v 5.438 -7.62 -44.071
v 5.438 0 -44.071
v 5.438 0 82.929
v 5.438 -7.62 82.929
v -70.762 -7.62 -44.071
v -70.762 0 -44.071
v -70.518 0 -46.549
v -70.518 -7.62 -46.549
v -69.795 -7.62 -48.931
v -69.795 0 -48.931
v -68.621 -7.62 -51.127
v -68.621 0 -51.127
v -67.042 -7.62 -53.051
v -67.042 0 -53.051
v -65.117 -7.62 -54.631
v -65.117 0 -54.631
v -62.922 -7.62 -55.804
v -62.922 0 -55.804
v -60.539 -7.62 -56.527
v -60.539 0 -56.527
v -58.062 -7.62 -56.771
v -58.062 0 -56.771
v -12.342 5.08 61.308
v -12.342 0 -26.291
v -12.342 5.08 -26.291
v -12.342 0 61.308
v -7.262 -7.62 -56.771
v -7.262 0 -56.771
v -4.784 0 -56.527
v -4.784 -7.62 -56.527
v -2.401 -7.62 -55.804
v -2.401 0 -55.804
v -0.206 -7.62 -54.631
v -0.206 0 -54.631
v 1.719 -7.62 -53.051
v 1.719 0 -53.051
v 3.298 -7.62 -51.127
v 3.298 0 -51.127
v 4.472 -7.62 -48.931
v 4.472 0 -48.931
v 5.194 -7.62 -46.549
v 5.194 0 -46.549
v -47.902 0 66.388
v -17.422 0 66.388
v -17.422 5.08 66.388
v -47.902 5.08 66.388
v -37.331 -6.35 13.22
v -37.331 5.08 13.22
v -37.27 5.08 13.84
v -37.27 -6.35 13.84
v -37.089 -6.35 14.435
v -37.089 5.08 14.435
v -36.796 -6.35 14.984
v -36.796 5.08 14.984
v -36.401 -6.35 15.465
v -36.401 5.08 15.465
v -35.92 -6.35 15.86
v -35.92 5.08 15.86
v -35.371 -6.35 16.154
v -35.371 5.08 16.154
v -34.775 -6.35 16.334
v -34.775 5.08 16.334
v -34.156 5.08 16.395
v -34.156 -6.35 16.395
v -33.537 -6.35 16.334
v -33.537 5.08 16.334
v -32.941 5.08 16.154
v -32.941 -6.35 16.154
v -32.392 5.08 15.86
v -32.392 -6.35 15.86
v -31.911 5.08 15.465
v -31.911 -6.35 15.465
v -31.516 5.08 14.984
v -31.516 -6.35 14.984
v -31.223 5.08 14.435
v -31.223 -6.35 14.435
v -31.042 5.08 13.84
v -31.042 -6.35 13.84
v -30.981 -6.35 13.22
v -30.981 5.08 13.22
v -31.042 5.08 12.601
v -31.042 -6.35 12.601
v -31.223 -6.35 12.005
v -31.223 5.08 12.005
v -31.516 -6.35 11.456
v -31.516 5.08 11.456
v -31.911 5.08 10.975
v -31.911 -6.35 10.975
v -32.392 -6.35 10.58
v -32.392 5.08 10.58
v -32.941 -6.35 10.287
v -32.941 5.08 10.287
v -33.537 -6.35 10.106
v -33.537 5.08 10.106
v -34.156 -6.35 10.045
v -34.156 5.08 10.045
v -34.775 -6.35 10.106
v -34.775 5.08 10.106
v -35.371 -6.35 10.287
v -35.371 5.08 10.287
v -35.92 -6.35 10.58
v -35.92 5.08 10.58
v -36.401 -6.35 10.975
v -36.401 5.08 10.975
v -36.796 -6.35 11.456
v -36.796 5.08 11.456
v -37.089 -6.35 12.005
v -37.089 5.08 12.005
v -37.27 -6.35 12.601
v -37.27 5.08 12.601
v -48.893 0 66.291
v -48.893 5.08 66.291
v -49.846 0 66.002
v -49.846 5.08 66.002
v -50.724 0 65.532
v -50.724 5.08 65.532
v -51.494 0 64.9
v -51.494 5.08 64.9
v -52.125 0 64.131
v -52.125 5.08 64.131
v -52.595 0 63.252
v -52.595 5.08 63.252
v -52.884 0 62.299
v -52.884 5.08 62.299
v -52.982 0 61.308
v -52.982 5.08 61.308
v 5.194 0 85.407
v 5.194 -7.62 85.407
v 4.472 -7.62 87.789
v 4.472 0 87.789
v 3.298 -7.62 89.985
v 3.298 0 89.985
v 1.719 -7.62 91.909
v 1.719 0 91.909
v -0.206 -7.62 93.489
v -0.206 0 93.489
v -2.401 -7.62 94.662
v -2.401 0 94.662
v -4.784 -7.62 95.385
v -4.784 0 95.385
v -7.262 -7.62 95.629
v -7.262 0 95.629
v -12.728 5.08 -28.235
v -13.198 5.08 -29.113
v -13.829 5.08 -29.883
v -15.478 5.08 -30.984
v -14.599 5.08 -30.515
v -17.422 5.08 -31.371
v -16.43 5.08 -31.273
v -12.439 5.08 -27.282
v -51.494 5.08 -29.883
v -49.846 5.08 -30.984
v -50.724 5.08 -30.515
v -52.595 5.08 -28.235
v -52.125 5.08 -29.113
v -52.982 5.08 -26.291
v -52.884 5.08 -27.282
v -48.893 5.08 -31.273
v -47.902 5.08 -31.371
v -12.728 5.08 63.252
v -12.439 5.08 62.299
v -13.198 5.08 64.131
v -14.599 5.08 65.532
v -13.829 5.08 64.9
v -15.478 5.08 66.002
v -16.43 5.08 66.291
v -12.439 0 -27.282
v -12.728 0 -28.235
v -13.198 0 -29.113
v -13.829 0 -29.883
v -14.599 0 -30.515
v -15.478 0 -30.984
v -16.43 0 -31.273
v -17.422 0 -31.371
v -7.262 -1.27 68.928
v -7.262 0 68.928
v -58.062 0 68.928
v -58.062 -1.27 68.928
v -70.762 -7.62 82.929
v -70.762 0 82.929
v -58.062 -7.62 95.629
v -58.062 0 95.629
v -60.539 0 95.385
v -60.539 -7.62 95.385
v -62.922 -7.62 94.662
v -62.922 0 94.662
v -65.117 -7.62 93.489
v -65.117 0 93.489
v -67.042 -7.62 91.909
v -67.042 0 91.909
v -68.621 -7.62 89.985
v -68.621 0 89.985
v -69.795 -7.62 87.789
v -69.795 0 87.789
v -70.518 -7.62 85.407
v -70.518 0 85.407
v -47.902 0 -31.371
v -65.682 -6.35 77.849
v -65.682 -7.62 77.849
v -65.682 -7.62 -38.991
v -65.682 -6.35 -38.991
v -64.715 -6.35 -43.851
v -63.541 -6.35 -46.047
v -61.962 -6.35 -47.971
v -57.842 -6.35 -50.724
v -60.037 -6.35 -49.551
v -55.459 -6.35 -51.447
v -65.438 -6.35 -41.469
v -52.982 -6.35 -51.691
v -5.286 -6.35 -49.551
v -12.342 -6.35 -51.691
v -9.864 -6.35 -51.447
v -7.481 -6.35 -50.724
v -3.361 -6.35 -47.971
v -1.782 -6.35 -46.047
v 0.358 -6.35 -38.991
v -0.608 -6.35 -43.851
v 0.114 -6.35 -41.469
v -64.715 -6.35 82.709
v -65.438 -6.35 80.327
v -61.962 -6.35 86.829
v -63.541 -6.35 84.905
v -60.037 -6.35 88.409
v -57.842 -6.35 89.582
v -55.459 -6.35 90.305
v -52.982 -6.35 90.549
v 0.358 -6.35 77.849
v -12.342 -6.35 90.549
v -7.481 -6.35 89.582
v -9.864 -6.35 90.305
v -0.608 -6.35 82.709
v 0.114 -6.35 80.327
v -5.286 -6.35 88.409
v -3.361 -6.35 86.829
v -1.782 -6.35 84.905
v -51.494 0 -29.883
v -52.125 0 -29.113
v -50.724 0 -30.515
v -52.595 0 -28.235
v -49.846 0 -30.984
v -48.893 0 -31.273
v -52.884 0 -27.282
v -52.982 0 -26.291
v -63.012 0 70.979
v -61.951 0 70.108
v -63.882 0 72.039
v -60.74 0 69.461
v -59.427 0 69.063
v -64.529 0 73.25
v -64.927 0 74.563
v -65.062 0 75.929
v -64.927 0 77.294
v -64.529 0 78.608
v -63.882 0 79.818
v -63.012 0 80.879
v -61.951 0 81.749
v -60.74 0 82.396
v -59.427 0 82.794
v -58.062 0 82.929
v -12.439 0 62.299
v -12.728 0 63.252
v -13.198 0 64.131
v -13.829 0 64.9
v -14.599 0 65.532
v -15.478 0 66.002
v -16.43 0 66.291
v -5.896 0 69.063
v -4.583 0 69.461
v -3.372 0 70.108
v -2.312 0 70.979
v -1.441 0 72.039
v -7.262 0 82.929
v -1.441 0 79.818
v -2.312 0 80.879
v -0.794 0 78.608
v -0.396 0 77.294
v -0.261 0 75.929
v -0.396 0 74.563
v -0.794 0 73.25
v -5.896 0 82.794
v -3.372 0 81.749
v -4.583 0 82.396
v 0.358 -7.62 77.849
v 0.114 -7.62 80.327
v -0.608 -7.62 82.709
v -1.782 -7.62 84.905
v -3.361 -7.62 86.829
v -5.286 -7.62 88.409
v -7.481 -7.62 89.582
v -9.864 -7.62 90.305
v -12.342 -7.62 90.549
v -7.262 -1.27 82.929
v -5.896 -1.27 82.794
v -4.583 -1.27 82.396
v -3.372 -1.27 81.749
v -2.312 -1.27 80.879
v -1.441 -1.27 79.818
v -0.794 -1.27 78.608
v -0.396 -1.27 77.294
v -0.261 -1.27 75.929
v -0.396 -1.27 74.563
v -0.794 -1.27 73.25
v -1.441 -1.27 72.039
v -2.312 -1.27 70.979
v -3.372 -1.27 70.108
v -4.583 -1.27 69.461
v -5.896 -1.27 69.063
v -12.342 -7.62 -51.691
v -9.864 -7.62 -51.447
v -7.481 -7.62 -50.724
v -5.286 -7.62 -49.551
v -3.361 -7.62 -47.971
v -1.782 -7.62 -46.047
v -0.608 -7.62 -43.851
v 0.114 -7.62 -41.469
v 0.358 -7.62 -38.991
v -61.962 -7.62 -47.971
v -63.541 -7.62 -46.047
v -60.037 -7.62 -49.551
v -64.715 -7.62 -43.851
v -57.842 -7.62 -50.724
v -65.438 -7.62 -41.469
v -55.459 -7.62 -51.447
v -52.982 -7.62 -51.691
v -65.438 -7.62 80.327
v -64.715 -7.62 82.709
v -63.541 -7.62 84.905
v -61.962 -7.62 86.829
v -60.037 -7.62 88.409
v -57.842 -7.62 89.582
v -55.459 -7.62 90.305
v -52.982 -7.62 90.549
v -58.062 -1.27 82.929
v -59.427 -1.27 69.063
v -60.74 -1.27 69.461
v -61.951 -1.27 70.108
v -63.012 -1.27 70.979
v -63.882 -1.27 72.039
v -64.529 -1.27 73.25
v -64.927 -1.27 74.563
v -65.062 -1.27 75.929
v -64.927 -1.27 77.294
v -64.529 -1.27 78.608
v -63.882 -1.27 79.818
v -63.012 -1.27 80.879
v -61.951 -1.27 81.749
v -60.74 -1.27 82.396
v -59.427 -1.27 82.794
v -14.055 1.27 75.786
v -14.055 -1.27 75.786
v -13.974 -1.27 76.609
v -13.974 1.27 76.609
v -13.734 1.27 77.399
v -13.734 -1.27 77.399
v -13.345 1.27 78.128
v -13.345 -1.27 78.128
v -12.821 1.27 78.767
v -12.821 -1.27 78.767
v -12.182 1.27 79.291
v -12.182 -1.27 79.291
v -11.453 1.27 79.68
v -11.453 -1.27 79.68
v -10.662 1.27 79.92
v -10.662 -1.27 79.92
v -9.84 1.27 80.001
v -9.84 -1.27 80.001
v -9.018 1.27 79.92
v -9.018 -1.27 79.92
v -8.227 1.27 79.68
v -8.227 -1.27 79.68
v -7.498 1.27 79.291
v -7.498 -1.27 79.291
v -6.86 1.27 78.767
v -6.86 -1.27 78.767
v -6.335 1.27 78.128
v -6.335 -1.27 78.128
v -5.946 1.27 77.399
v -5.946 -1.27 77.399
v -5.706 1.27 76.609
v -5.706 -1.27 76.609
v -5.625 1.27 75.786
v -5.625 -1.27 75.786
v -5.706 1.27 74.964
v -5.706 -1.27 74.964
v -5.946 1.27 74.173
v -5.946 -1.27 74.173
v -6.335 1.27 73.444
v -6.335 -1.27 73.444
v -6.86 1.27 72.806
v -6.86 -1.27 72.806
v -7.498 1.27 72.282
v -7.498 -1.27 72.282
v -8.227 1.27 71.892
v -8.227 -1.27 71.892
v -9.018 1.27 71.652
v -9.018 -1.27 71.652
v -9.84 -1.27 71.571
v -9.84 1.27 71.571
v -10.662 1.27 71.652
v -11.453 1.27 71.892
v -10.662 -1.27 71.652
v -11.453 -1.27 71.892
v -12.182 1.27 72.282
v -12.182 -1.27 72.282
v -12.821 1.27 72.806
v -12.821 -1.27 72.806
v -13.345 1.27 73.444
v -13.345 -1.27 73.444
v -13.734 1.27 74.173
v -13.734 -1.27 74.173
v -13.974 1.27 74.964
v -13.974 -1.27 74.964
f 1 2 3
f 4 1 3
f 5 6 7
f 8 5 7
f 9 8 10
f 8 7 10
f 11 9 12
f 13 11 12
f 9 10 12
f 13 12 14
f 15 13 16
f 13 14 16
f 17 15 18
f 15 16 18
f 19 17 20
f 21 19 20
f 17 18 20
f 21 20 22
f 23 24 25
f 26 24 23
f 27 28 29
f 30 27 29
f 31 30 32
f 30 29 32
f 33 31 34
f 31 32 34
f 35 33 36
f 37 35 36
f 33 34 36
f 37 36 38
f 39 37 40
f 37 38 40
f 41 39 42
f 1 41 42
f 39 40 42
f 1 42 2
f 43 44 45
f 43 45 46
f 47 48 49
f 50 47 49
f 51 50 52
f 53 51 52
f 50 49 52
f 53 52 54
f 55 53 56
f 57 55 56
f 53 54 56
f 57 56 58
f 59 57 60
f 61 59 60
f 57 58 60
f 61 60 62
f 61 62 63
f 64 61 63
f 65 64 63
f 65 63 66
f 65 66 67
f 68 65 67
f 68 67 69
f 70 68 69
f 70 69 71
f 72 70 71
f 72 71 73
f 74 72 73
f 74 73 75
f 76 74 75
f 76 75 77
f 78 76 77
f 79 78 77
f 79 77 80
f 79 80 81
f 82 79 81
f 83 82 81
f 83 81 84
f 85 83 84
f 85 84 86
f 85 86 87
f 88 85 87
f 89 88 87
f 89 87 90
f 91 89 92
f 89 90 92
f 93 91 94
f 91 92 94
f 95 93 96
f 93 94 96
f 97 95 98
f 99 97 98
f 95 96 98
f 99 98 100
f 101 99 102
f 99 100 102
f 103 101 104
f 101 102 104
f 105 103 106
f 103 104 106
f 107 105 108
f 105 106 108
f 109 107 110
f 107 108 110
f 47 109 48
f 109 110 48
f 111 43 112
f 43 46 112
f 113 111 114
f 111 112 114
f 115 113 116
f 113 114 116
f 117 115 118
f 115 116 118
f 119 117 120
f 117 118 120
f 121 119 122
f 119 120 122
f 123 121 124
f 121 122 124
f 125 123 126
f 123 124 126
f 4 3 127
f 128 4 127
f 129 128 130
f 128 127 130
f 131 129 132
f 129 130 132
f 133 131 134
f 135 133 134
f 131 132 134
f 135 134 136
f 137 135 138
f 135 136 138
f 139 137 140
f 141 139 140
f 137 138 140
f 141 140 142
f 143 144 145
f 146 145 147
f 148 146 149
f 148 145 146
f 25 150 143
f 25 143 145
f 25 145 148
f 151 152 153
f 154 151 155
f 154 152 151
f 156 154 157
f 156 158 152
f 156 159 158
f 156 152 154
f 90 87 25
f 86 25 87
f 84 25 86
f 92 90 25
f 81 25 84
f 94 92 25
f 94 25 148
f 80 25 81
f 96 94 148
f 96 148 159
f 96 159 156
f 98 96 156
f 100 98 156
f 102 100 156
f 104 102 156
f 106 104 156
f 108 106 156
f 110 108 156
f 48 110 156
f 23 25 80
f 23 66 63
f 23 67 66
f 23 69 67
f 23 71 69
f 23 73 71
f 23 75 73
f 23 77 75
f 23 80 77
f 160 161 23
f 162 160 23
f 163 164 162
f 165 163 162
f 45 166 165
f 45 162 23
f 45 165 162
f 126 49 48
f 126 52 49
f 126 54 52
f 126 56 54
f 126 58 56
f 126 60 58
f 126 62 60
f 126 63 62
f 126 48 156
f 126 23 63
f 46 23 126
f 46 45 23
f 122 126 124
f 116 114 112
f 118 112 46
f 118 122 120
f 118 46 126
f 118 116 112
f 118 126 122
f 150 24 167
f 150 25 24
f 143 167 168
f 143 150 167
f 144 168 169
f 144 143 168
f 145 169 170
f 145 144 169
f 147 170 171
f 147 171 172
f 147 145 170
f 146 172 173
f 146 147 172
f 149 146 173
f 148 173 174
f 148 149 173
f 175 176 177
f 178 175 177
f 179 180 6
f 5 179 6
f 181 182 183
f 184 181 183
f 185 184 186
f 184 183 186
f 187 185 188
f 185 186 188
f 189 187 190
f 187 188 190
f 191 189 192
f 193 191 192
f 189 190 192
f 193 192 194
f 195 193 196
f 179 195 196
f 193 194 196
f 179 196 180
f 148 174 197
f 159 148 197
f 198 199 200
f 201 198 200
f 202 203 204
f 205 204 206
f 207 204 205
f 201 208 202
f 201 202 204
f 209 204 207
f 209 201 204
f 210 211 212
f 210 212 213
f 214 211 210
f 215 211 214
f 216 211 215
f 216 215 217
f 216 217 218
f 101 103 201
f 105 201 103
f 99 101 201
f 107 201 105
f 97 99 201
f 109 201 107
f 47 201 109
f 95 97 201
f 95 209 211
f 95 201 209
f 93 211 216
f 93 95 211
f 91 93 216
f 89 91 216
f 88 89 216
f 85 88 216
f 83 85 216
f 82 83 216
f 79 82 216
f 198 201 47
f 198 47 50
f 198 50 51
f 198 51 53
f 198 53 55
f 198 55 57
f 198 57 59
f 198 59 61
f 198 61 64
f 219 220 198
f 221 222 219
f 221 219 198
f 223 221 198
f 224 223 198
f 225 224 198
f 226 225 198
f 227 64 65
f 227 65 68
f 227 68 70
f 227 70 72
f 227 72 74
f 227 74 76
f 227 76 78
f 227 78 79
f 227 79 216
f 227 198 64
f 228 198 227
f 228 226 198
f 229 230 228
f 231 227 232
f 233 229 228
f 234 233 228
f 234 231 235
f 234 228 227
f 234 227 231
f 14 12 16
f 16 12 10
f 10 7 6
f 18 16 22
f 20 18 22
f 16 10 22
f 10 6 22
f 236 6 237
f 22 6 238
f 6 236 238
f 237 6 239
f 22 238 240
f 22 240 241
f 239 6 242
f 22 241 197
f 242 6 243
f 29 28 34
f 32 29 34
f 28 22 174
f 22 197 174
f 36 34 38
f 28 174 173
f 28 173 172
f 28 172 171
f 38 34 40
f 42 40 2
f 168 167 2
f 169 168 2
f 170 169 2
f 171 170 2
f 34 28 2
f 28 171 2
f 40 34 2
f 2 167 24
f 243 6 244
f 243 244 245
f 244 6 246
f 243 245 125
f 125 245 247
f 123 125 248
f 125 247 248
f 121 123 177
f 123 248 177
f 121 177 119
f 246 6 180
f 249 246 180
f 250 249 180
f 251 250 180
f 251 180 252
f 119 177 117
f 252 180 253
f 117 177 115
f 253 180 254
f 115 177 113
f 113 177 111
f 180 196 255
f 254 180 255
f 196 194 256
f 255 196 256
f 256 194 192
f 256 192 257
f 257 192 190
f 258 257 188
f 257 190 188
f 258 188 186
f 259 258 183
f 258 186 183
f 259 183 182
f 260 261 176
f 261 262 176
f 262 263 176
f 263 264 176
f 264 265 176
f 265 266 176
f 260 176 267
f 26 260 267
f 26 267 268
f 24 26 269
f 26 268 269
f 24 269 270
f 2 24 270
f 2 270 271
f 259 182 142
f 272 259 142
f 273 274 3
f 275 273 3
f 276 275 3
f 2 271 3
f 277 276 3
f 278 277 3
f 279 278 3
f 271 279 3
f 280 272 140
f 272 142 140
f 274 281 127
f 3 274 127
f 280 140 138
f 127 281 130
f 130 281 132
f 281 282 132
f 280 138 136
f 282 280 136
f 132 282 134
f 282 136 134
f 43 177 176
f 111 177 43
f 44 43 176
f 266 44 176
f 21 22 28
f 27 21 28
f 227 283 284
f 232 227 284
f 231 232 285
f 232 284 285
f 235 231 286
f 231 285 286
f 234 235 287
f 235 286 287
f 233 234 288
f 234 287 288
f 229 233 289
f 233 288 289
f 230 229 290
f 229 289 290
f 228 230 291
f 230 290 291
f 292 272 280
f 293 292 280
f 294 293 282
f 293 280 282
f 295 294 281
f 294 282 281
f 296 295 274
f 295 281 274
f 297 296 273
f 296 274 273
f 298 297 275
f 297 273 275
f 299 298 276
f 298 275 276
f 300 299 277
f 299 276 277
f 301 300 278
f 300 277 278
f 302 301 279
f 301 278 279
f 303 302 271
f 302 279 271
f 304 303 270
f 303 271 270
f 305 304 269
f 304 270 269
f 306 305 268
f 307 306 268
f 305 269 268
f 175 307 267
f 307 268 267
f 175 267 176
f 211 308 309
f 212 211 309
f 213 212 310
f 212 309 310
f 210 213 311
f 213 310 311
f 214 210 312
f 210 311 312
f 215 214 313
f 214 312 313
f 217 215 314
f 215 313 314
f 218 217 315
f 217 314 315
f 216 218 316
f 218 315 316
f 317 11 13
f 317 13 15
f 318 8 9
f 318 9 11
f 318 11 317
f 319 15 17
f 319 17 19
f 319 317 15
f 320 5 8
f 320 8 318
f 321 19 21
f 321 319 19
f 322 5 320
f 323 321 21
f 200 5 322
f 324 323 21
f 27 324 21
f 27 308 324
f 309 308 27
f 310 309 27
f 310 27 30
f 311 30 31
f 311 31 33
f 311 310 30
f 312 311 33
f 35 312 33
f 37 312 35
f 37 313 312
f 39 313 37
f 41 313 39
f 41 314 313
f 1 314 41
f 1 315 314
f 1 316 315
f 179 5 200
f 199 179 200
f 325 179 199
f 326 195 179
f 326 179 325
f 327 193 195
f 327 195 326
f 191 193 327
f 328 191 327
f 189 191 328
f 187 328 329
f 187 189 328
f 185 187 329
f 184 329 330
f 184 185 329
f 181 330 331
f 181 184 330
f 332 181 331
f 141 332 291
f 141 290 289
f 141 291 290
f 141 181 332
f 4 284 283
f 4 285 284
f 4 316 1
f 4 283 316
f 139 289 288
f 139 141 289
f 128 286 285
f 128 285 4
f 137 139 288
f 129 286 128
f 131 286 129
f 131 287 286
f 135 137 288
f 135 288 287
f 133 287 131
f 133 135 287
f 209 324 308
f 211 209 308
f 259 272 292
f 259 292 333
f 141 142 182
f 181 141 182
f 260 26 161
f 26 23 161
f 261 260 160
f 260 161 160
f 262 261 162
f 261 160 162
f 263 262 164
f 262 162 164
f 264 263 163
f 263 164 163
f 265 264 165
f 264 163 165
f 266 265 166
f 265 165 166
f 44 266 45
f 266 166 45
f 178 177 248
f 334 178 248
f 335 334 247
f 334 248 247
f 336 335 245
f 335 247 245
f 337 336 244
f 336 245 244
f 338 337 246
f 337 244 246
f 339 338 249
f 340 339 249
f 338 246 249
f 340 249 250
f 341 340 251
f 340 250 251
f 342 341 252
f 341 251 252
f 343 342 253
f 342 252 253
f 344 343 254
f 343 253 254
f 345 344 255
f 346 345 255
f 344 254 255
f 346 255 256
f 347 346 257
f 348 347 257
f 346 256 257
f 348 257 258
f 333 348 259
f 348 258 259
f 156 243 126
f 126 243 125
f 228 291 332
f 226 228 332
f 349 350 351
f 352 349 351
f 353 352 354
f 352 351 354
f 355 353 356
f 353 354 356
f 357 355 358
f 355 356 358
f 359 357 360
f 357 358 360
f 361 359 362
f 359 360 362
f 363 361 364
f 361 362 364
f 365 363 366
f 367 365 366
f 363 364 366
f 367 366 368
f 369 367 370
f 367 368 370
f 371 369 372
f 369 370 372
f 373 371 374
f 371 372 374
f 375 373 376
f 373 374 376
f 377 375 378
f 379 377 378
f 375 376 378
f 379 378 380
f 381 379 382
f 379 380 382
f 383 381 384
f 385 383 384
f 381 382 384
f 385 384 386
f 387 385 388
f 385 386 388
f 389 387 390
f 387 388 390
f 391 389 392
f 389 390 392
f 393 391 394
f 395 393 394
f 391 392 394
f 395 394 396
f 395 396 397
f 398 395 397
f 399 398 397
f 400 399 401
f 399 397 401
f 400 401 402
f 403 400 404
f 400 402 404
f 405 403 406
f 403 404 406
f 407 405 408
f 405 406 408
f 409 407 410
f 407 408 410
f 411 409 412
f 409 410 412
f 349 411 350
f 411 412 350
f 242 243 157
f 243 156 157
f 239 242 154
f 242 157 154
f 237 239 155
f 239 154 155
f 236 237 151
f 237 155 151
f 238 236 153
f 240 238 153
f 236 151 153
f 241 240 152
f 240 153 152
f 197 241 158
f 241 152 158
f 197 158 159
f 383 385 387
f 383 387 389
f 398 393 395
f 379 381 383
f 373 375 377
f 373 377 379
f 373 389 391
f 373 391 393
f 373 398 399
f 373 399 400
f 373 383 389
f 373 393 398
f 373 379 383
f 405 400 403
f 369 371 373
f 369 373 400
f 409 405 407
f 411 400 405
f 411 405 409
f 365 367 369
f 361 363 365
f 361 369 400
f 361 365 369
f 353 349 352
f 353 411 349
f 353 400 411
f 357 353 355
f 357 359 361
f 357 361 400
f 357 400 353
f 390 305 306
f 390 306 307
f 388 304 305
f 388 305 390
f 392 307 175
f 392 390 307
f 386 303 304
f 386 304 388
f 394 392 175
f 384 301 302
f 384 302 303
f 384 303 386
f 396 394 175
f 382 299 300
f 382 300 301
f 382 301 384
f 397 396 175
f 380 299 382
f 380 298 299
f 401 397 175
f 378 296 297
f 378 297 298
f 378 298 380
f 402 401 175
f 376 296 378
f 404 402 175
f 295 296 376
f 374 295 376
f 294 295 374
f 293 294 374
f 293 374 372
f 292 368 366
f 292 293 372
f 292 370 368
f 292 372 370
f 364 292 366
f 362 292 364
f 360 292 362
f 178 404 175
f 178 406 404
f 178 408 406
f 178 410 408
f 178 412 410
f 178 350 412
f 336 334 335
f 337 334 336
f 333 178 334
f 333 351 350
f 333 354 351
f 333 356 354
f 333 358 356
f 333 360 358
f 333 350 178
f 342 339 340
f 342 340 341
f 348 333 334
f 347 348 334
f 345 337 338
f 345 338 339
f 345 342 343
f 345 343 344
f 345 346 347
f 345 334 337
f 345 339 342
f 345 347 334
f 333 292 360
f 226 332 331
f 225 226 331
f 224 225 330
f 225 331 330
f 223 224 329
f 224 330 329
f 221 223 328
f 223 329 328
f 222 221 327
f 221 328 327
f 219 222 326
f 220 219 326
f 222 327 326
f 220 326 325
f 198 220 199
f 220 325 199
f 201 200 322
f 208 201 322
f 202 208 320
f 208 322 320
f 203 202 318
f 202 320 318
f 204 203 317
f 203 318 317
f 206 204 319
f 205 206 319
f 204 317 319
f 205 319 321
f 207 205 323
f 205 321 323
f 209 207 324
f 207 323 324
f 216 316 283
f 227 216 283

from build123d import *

# Parameters (mm, degrees)
F1_DEPTH  = 7.62
F2_W      = 50.8
F2_H      = 14.000721
F3_DEPTH  = 1.27
F4_R      = 4.215081
F5_DEPTH  = 2.54
F6_W      = 40.64
F6_H      = 97.759279
F7_DEPTH  = 5.08
F8_R      = 5.08
F10_DEPTH = 1.27
F12_D     = 6.35


with BuildPart() as f1:
    # F0 (on Front) → F1 (new body)
    with BuildSketch(Plane.XZ):
        with BuildLine():
            Line((-7.261533, 95.628948), (-58.061533, 95.628948))
            ThreePointArc((-58.061533, 95.628948), (-67.041789, 91.909204), (-70.761533, 82.928948))
            Line((-70.761533, 82.928948), (-70.761533, -44.071052))
            ThreePointArc((-70.761533, -44.071052), (-67.041789, -53.051308), (-58.061533, -56.771052))
            Line((-58.061533, -56.771052), (-7.261533, -56.771052))
            ThreePointArc((-7.261533, -56.771052), (1.718724, -53.051308), (5.438467, -44.071052))
            Line((5.438467, -44.071052), (5.438467, 82.928948))
            ThreePointArc((5.438467, 82.928948), (1.718724, 91.909204), (-7.261533, 95.628948))
        make_face()
    extrude(amount=F1_DEPTH)

    # F2 (on face) → F3 (cut)
    with BuildSketch(Plane(origin=(0, 0, 0), x_dir=(-1, 0, 0), z_dir=(0, 1, 0))):
        with BuildLine():
            Line((7.261533, 68.928227), (7.261533, 82.928948))
            ThreePointArc((7.261533, 82.928948), (0.261172, 75.928588), (7.261533, 68.928227))
        make_face()
        with Locations((32.661533, 75.928587)):
            Rectangle(F2_W, F2_H)
        with BuildLine():
            ThreePointArc((58.061533, 68.928227), (65.061893, 75.928588), (58.061533, 82.928948))
            Line((58.061533, 82.928948), (58.061533, 68.928227))
        make_face()
    extrude(amount=-F3_DEPTH, mode=Mode.SUBTRACT)

    # F4 (on face) → F5 (join)
    with BuildSketch(Plane(origin=(0, -1.27, 0), x_dir=(-1, 0, 0), z_dir=(0, 1, 0))):
        with Locations((9.840052, 75.786227)):
            Circle(F4_R)
    extrude(amount=F5_DEPTH)

    # F6 (on face) → F7 (join)
    with BuildSketch(Plane(origin=(0, 0, 0), x_dir=(-1, 0, 0), z_dir=(0, 1, 0))):
        with Locations((32.661533, 17.508588)):
            Rectangle(F6_W, F6_H)
    extrude(amount=F7_DEPTH)

    # F8
    f8_edges = [f1.edges().sort_by_distance(p)[0] for p in [
        (-12.341533, 2.54, 66.388227),
        (-52.981533, 2.54, 66.388227),
        (-52.981533, 2.54, -31.371052),
        (-12.341533, 2.54, -31.371052),
    ]]
    fillet(f8_edges, radius=F8_R)

    # F9 (on face) → F10 (cut)
    with BuildSketch(Plane.XZ.offset(7.62)):
        with BuildLine():
            Line((-12.341533, 90.548948), (-52.981533, 90.548948))
            ThreePointArc((-52.981533, 90.548948), (-61.961789, 86.829204), (-65.681533, 77.848948))
            Line((-65.681533, 77.848948), (-65.681533, -38.991052))
            ThreePointArc((-65.681533, -38.991052), (-61.961789, -47.971308), (-52.981533, -51.691052))
            Line((-52.981533, -51.691052), (-12.341533, -51.691052))
            ThreePointArc((-12.341533, -51.691052), (-3.361276, -47.971308), (0.358467, -38.991052))
            Line((0.358467, -38.991052), (0.358467, 77.848948))
            ThreePointArc((0.358467, 77.848948), (-3.361276, 86.829204), (-12.341533, 90.548948))
        make_face()
    extrude(amount=-F10_DEPTH, mode=Mode.SUBTRACT)

    # F12 (through all)
    with Locations(Plane.XZ.offset(6.35)):
        with Locations((-34.155931, 13.220405)):
            Hole(F12_D / 2)


solid = f1.part
